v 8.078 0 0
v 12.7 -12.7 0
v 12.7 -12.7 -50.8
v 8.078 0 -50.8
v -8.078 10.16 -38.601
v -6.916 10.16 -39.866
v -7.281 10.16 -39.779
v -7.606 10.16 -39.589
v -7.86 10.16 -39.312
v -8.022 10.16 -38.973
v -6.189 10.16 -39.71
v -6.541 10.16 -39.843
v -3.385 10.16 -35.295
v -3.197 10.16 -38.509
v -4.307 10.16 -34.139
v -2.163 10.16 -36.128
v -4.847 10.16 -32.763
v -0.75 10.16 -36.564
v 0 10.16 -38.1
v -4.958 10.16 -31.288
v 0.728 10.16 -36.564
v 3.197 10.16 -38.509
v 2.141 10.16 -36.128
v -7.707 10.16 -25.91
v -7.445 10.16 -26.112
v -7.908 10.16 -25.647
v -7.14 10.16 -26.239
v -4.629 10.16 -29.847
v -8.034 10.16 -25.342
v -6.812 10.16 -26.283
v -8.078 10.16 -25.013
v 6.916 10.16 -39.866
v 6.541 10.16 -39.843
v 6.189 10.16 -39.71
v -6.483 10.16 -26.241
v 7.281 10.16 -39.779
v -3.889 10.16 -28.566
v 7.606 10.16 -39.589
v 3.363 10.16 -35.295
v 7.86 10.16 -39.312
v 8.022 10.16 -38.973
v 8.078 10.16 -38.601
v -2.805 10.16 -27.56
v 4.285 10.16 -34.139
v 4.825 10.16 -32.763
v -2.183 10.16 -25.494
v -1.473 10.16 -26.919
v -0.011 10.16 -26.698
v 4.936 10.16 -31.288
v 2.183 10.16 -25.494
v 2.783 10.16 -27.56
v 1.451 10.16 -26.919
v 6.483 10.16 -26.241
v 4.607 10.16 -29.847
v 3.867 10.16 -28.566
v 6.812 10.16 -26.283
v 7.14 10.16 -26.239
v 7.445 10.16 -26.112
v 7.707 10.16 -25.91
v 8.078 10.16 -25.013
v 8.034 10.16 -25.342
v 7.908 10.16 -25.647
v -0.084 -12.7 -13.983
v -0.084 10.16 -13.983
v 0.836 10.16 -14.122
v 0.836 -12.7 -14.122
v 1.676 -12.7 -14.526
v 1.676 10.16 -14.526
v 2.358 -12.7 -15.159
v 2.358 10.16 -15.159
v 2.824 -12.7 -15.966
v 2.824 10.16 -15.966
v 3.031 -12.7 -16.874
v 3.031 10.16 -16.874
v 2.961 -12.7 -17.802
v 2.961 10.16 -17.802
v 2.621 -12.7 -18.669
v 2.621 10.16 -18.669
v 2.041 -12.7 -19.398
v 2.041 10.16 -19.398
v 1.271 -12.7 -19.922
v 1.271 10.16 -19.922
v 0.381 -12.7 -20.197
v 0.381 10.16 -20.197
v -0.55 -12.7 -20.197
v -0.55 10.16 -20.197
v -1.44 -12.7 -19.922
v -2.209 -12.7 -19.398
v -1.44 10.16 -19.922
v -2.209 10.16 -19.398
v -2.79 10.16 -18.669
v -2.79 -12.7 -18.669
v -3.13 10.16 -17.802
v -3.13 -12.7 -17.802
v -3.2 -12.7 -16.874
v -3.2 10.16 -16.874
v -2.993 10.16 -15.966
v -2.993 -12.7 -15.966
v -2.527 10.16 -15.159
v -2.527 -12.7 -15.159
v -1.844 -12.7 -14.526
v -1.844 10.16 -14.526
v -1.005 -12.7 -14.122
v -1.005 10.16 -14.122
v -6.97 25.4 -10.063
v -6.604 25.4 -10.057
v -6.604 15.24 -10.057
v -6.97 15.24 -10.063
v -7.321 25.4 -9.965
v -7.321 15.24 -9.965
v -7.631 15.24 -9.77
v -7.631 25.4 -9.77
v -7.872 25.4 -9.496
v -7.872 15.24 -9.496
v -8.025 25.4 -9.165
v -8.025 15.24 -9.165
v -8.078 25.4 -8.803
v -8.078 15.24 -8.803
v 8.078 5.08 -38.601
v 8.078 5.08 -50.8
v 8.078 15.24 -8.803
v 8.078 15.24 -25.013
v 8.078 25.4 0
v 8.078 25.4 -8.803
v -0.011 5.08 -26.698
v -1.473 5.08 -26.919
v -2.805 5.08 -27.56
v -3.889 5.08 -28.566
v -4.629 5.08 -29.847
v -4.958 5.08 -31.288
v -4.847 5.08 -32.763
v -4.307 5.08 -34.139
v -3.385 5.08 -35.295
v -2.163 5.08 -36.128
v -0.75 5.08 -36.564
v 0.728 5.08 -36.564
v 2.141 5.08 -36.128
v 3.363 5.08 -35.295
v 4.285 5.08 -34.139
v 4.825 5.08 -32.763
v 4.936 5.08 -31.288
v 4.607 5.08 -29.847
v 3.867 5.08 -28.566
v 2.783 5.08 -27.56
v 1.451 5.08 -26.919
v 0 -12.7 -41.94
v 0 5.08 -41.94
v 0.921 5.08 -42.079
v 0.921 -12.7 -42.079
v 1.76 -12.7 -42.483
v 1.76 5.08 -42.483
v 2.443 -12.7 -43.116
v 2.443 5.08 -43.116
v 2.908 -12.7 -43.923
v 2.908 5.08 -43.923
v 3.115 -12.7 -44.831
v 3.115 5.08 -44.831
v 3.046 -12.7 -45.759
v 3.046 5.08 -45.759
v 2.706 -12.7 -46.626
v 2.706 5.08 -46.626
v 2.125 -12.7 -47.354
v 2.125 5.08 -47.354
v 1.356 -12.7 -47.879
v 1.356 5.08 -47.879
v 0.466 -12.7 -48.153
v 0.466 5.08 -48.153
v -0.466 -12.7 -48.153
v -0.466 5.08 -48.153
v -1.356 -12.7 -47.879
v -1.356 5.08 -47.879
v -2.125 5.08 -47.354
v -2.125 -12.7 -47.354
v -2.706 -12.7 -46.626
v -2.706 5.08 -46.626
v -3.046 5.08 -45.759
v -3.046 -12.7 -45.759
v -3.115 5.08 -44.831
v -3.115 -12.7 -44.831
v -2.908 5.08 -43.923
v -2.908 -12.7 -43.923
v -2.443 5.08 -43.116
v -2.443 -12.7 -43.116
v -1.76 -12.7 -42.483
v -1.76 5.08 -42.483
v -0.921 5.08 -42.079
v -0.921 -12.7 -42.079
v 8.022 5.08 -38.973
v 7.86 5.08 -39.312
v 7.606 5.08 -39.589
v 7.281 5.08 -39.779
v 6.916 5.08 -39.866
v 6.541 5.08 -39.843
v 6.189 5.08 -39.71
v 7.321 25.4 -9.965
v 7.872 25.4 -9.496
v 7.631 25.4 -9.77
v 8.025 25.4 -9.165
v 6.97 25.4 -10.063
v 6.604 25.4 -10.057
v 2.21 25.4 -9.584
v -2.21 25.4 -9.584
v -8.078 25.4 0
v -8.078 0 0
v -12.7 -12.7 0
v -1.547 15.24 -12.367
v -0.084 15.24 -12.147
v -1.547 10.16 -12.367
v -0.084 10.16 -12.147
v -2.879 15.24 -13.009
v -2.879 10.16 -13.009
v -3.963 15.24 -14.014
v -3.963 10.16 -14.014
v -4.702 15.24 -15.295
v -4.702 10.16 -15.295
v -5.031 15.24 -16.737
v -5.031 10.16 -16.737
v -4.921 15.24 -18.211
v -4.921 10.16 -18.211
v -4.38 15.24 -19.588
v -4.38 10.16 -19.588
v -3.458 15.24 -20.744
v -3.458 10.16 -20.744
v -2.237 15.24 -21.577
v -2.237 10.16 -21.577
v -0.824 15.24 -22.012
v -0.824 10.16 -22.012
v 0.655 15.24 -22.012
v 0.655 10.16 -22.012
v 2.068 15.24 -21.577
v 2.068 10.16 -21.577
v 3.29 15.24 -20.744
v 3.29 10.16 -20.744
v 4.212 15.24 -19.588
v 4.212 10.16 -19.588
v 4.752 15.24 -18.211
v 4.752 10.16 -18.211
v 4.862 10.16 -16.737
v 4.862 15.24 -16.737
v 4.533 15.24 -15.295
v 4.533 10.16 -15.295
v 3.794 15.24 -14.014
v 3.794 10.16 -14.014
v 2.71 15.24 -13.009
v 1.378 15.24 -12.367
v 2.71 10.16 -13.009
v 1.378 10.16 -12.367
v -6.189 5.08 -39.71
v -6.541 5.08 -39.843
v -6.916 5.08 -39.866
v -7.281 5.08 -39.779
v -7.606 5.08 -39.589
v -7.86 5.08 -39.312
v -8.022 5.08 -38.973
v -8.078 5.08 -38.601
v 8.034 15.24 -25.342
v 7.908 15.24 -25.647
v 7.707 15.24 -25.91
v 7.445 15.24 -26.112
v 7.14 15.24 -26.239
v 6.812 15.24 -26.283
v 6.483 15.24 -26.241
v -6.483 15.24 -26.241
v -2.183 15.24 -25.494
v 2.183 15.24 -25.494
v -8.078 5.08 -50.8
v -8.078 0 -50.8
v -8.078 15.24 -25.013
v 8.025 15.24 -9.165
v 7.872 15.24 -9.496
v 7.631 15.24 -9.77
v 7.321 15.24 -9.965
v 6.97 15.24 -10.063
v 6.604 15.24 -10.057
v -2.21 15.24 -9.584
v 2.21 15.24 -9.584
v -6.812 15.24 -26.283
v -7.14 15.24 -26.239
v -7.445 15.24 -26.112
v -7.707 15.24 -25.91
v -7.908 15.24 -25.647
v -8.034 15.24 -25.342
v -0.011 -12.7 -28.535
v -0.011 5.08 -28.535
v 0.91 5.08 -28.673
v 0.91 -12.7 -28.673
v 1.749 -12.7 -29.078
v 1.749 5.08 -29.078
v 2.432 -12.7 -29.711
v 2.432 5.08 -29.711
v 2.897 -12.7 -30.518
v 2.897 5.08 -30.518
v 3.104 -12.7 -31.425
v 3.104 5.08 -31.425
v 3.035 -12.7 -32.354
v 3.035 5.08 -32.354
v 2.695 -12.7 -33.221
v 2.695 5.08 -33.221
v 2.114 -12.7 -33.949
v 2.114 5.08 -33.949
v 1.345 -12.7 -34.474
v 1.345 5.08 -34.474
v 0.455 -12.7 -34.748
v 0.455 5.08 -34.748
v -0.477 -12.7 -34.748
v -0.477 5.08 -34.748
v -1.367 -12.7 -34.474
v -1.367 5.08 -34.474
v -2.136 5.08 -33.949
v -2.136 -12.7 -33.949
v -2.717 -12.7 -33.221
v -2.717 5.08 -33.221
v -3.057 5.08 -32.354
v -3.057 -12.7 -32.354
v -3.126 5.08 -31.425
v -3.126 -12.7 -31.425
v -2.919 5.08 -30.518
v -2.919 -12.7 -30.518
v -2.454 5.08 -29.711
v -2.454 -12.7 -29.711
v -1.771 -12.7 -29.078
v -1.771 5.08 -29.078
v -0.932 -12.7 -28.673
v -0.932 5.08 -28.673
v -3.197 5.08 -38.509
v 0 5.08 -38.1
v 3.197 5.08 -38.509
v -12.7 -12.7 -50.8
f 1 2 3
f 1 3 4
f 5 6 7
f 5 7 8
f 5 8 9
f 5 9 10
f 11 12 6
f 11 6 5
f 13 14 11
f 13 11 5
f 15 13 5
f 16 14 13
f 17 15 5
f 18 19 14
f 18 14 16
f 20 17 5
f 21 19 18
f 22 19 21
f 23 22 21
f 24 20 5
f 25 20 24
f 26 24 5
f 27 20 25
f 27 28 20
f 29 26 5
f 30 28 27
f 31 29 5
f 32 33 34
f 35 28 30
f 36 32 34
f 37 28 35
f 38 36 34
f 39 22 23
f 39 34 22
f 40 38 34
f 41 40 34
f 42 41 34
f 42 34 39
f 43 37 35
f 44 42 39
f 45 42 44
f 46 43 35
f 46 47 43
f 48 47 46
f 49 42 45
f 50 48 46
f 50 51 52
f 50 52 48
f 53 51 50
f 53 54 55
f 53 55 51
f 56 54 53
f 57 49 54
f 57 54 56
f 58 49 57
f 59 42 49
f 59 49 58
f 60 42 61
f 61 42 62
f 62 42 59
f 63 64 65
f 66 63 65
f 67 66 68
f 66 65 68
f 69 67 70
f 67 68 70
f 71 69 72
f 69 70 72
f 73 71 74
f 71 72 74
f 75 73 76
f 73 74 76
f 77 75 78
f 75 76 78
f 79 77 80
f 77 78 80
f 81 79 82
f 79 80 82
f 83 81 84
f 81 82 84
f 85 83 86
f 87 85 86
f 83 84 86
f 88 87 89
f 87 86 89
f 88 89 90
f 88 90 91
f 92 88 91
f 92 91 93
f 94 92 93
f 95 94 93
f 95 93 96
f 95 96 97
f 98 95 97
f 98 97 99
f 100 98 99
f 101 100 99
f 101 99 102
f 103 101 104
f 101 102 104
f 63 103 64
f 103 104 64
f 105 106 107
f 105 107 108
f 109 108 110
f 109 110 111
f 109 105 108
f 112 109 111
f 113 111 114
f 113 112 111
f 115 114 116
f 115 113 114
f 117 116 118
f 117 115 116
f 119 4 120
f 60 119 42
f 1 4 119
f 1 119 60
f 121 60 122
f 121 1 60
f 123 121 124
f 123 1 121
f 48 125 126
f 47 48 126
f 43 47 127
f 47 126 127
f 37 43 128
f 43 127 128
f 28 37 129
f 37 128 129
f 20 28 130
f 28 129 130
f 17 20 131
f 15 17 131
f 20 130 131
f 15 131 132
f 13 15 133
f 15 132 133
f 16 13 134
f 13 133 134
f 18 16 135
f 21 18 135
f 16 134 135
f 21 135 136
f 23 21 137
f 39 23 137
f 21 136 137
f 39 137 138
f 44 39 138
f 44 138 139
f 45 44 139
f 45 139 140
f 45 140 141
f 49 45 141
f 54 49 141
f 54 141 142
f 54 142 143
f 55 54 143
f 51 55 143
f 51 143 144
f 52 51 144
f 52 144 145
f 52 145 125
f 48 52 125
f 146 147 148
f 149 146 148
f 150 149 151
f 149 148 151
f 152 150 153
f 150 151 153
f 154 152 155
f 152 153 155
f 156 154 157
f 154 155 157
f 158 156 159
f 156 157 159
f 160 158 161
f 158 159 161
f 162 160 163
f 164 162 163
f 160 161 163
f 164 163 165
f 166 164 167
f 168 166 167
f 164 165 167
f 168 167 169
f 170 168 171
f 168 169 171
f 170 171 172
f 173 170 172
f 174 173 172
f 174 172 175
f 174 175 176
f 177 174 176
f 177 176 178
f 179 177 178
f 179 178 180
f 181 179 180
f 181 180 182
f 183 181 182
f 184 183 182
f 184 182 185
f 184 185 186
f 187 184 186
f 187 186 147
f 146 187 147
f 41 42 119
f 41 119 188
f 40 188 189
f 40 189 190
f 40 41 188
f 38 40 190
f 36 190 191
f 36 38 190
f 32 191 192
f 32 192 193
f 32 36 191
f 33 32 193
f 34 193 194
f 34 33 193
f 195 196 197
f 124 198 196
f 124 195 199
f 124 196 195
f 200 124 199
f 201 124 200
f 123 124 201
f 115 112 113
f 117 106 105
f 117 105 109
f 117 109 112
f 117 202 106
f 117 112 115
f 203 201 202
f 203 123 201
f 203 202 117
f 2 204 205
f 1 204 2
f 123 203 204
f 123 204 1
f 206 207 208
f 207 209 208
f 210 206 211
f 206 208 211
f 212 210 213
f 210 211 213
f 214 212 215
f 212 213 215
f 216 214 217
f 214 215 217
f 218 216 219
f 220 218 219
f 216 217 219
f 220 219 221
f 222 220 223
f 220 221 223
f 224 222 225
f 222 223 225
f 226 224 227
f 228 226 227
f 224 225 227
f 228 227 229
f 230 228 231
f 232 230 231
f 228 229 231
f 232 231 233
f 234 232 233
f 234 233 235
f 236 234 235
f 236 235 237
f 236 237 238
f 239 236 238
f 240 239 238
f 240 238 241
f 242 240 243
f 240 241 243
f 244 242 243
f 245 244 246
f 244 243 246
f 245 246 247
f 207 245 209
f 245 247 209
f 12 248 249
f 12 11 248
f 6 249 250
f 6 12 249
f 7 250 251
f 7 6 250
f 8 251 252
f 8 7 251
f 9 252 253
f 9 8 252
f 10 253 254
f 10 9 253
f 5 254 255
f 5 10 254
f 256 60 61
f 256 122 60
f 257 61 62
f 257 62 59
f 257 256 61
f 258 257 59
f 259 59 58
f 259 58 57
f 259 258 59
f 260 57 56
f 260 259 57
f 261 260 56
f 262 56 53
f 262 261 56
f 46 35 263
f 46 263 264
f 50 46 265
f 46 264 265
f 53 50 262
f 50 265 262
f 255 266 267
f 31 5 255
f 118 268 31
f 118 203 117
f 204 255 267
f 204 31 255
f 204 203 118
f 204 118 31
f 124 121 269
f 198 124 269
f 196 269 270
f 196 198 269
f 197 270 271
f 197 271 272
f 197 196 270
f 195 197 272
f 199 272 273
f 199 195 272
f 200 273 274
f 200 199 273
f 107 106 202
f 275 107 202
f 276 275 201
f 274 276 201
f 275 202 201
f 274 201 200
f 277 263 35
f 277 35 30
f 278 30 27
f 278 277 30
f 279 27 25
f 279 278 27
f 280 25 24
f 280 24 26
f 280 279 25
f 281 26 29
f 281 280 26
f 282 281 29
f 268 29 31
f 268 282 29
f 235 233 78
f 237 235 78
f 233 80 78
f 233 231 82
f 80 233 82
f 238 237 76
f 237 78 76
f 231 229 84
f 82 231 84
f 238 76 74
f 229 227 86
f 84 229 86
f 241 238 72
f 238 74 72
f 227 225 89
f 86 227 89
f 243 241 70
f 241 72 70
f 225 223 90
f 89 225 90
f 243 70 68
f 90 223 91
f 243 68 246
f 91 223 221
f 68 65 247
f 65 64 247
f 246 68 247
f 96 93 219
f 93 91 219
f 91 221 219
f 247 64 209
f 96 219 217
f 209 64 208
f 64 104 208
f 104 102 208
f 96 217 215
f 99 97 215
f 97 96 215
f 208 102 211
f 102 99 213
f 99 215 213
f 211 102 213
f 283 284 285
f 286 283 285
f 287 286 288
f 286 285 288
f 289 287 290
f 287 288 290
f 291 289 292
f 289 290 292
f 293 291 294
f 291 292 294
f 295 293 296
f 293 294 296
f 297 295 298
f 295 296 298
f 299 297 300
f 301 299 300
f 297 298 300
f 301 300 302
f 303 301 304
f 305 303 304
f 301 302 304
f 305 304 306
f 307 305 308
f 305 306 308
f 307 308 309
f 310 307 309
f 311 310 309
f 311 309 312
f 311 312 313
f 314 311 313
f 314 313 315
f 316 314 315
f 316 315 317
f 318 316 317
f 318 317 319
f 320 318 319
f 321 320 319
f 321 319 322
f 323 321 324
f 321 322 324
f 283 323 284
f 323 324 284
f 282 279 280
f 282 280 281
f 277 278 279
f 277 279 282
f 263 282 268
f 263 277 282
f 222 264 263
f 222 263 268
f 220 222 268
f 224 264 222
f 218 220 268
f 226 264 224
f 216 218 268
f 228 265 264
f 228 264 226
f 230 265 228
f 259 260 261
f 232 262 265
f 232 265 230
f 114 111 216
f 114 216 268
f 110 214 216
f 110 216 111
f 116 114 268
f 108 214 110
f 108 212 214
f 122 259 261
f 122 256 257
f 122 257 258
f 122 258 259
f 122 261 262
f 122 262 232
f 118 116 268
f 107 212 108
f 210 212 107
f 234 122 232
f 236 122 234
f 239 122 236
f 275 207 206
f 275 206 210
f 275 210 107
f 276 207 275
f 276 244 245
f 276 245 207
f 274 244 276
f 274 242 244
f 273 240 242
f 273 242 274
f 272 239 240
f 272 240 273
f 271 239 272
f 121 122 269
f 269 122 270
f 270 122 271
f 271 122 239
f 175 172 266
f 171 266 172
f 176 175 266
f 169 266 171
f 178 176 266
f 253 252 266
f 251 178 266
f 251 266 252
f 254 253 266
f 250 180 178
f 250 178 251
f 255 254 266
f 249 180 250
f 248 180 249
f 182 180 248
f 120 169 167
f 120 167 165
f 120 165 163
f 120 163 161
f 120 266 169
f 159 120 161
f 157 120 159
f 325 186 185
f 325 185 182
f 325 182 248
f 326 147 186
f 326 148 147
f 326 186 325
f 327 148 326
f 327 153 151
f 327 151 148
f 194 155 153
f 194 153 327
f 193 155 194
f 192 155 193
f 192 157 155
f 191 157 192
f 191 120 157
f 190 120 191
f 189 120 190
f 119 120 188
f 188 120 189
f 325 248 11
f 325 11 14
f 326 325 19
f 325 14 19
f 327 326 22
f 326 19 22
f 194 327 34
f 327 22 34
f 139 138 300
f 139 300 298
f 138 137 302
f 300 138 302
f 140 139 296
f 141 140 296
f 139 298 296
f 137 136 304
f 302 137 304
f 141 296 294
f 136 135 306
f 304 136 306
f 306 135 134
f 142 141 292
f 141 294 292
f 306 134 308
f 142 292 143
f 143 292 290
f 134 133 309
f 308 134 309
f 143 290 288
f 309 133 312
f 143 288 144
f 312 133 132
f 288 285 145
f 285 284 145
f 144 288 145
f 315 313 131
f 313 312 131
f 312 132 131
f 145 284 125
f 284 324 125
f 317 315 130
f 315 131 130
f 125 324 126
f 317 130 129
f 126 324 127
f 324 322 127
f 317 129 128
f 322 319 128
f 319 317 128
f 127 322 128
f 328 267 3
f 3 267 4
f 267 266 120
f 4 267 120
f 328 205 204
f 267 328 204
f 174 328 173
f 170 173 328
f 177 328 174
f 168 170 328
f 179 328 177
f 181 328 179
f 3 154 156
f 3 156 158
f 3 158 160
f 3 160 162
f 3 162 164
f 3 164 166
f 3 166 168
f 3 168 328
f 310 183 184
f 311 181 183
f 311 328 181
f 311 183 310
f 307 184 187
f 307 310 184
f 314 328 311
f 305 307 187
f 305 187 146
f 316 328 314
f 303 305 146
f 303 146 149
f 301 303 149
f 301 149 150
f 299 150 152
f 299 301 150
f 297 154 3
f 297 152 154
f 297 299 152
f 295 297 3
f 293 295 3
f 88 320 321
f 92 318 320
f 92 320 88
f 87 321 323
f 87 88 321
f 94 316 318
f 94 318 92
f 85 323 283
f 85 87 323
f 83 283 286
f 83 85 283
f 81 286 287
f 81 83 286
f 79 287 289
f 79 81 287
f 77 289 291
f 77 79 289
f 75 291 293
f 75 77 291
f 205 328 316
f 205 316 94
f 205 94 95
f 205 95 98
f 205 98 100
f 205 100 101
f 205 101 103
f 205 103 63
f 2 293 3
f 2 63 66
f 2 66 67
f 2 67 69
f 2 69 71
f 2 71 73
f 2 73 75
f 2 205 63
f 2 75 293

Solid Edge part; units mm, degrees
sketch "Sketch1" plane through (0, 0, 0) normal (0, 0, 1) x (1, 0, 0)
  line L0 (12.7, -12.7) -> (8.0776, 0)
  line L1 (8.0776, 0) -> (8.0776, 25.4)
  line L2 (8.0776, 25.4) -> (-8.0776, 25.4)
  line L3 (-8.0776, 25.4) -> (-8.0776, 0)
  line L4 (-12.7, -12.7) -> (-8.0776, 0)
  line L5 (-12.7, -12.7) -> (12.7, -12.7)
extrude "Protrusion1" add sketch "Sketch1" against normal blind 50.8
sketch "Sketch2" plane through (0, 25.4, -25.4) normal (0, 1, 0) x (0, 0, -1)
  circle A0 centre (25.4, 0) radius 12.7
extrude "ExtrudedCutout_1" cut sketch "Sketch2" against normal blind 20.32
sketch "Sketch3" plane through (0, 25.4, -25.4) normal (0, 1, 0) x (0, 0, -1)
  circle A0 centre (25.4, 0) radius 25.4
extrude "ExtrudedCutout_2" cut sketch "Sketch3" against normal blind 15.24
sketch "Sketch4" plane through (0, 25.4, -25.4) normal (0, 1, 0) x (0, 0, -1)
  circle A0 centre (25.4, 0) radius 41.275
extrude "ExtrudedCutout_3" cut sketch "Sketch4" against normal blind 10.16
fillet "Round_1" radius 1.27 6 edges at (8.0776, 20.32, -10.3231) (-8.0776, 20.32, -10.3231) (8.0776, 12.7, -26.7186) (-8.0776, 12.7, -26.7186) (8.0776, 7.62, -40.9999) (-8.0776, 7.62, -40.9999)
hole "Hole_1" at (-0.0844, 15.24, -17.1073) direction (0, -1, 0) diameter 6.2484 end up to next counterbore diameter 9.9212 counterbore depth 5.08
hole "Hole_2" at (-0.011, 10.16, -31.6589) direction (0, -1, 0) diameter 6.2484 end up to next counterbore diameter 9.9212 counterbore depth 5.08
hole "Hole1" at (0, 10.16, -45.064) direction (0, -1, 0) diameter 6.2484 end up to next counterbore diameter 9.9212 counterbore depth 5.08
